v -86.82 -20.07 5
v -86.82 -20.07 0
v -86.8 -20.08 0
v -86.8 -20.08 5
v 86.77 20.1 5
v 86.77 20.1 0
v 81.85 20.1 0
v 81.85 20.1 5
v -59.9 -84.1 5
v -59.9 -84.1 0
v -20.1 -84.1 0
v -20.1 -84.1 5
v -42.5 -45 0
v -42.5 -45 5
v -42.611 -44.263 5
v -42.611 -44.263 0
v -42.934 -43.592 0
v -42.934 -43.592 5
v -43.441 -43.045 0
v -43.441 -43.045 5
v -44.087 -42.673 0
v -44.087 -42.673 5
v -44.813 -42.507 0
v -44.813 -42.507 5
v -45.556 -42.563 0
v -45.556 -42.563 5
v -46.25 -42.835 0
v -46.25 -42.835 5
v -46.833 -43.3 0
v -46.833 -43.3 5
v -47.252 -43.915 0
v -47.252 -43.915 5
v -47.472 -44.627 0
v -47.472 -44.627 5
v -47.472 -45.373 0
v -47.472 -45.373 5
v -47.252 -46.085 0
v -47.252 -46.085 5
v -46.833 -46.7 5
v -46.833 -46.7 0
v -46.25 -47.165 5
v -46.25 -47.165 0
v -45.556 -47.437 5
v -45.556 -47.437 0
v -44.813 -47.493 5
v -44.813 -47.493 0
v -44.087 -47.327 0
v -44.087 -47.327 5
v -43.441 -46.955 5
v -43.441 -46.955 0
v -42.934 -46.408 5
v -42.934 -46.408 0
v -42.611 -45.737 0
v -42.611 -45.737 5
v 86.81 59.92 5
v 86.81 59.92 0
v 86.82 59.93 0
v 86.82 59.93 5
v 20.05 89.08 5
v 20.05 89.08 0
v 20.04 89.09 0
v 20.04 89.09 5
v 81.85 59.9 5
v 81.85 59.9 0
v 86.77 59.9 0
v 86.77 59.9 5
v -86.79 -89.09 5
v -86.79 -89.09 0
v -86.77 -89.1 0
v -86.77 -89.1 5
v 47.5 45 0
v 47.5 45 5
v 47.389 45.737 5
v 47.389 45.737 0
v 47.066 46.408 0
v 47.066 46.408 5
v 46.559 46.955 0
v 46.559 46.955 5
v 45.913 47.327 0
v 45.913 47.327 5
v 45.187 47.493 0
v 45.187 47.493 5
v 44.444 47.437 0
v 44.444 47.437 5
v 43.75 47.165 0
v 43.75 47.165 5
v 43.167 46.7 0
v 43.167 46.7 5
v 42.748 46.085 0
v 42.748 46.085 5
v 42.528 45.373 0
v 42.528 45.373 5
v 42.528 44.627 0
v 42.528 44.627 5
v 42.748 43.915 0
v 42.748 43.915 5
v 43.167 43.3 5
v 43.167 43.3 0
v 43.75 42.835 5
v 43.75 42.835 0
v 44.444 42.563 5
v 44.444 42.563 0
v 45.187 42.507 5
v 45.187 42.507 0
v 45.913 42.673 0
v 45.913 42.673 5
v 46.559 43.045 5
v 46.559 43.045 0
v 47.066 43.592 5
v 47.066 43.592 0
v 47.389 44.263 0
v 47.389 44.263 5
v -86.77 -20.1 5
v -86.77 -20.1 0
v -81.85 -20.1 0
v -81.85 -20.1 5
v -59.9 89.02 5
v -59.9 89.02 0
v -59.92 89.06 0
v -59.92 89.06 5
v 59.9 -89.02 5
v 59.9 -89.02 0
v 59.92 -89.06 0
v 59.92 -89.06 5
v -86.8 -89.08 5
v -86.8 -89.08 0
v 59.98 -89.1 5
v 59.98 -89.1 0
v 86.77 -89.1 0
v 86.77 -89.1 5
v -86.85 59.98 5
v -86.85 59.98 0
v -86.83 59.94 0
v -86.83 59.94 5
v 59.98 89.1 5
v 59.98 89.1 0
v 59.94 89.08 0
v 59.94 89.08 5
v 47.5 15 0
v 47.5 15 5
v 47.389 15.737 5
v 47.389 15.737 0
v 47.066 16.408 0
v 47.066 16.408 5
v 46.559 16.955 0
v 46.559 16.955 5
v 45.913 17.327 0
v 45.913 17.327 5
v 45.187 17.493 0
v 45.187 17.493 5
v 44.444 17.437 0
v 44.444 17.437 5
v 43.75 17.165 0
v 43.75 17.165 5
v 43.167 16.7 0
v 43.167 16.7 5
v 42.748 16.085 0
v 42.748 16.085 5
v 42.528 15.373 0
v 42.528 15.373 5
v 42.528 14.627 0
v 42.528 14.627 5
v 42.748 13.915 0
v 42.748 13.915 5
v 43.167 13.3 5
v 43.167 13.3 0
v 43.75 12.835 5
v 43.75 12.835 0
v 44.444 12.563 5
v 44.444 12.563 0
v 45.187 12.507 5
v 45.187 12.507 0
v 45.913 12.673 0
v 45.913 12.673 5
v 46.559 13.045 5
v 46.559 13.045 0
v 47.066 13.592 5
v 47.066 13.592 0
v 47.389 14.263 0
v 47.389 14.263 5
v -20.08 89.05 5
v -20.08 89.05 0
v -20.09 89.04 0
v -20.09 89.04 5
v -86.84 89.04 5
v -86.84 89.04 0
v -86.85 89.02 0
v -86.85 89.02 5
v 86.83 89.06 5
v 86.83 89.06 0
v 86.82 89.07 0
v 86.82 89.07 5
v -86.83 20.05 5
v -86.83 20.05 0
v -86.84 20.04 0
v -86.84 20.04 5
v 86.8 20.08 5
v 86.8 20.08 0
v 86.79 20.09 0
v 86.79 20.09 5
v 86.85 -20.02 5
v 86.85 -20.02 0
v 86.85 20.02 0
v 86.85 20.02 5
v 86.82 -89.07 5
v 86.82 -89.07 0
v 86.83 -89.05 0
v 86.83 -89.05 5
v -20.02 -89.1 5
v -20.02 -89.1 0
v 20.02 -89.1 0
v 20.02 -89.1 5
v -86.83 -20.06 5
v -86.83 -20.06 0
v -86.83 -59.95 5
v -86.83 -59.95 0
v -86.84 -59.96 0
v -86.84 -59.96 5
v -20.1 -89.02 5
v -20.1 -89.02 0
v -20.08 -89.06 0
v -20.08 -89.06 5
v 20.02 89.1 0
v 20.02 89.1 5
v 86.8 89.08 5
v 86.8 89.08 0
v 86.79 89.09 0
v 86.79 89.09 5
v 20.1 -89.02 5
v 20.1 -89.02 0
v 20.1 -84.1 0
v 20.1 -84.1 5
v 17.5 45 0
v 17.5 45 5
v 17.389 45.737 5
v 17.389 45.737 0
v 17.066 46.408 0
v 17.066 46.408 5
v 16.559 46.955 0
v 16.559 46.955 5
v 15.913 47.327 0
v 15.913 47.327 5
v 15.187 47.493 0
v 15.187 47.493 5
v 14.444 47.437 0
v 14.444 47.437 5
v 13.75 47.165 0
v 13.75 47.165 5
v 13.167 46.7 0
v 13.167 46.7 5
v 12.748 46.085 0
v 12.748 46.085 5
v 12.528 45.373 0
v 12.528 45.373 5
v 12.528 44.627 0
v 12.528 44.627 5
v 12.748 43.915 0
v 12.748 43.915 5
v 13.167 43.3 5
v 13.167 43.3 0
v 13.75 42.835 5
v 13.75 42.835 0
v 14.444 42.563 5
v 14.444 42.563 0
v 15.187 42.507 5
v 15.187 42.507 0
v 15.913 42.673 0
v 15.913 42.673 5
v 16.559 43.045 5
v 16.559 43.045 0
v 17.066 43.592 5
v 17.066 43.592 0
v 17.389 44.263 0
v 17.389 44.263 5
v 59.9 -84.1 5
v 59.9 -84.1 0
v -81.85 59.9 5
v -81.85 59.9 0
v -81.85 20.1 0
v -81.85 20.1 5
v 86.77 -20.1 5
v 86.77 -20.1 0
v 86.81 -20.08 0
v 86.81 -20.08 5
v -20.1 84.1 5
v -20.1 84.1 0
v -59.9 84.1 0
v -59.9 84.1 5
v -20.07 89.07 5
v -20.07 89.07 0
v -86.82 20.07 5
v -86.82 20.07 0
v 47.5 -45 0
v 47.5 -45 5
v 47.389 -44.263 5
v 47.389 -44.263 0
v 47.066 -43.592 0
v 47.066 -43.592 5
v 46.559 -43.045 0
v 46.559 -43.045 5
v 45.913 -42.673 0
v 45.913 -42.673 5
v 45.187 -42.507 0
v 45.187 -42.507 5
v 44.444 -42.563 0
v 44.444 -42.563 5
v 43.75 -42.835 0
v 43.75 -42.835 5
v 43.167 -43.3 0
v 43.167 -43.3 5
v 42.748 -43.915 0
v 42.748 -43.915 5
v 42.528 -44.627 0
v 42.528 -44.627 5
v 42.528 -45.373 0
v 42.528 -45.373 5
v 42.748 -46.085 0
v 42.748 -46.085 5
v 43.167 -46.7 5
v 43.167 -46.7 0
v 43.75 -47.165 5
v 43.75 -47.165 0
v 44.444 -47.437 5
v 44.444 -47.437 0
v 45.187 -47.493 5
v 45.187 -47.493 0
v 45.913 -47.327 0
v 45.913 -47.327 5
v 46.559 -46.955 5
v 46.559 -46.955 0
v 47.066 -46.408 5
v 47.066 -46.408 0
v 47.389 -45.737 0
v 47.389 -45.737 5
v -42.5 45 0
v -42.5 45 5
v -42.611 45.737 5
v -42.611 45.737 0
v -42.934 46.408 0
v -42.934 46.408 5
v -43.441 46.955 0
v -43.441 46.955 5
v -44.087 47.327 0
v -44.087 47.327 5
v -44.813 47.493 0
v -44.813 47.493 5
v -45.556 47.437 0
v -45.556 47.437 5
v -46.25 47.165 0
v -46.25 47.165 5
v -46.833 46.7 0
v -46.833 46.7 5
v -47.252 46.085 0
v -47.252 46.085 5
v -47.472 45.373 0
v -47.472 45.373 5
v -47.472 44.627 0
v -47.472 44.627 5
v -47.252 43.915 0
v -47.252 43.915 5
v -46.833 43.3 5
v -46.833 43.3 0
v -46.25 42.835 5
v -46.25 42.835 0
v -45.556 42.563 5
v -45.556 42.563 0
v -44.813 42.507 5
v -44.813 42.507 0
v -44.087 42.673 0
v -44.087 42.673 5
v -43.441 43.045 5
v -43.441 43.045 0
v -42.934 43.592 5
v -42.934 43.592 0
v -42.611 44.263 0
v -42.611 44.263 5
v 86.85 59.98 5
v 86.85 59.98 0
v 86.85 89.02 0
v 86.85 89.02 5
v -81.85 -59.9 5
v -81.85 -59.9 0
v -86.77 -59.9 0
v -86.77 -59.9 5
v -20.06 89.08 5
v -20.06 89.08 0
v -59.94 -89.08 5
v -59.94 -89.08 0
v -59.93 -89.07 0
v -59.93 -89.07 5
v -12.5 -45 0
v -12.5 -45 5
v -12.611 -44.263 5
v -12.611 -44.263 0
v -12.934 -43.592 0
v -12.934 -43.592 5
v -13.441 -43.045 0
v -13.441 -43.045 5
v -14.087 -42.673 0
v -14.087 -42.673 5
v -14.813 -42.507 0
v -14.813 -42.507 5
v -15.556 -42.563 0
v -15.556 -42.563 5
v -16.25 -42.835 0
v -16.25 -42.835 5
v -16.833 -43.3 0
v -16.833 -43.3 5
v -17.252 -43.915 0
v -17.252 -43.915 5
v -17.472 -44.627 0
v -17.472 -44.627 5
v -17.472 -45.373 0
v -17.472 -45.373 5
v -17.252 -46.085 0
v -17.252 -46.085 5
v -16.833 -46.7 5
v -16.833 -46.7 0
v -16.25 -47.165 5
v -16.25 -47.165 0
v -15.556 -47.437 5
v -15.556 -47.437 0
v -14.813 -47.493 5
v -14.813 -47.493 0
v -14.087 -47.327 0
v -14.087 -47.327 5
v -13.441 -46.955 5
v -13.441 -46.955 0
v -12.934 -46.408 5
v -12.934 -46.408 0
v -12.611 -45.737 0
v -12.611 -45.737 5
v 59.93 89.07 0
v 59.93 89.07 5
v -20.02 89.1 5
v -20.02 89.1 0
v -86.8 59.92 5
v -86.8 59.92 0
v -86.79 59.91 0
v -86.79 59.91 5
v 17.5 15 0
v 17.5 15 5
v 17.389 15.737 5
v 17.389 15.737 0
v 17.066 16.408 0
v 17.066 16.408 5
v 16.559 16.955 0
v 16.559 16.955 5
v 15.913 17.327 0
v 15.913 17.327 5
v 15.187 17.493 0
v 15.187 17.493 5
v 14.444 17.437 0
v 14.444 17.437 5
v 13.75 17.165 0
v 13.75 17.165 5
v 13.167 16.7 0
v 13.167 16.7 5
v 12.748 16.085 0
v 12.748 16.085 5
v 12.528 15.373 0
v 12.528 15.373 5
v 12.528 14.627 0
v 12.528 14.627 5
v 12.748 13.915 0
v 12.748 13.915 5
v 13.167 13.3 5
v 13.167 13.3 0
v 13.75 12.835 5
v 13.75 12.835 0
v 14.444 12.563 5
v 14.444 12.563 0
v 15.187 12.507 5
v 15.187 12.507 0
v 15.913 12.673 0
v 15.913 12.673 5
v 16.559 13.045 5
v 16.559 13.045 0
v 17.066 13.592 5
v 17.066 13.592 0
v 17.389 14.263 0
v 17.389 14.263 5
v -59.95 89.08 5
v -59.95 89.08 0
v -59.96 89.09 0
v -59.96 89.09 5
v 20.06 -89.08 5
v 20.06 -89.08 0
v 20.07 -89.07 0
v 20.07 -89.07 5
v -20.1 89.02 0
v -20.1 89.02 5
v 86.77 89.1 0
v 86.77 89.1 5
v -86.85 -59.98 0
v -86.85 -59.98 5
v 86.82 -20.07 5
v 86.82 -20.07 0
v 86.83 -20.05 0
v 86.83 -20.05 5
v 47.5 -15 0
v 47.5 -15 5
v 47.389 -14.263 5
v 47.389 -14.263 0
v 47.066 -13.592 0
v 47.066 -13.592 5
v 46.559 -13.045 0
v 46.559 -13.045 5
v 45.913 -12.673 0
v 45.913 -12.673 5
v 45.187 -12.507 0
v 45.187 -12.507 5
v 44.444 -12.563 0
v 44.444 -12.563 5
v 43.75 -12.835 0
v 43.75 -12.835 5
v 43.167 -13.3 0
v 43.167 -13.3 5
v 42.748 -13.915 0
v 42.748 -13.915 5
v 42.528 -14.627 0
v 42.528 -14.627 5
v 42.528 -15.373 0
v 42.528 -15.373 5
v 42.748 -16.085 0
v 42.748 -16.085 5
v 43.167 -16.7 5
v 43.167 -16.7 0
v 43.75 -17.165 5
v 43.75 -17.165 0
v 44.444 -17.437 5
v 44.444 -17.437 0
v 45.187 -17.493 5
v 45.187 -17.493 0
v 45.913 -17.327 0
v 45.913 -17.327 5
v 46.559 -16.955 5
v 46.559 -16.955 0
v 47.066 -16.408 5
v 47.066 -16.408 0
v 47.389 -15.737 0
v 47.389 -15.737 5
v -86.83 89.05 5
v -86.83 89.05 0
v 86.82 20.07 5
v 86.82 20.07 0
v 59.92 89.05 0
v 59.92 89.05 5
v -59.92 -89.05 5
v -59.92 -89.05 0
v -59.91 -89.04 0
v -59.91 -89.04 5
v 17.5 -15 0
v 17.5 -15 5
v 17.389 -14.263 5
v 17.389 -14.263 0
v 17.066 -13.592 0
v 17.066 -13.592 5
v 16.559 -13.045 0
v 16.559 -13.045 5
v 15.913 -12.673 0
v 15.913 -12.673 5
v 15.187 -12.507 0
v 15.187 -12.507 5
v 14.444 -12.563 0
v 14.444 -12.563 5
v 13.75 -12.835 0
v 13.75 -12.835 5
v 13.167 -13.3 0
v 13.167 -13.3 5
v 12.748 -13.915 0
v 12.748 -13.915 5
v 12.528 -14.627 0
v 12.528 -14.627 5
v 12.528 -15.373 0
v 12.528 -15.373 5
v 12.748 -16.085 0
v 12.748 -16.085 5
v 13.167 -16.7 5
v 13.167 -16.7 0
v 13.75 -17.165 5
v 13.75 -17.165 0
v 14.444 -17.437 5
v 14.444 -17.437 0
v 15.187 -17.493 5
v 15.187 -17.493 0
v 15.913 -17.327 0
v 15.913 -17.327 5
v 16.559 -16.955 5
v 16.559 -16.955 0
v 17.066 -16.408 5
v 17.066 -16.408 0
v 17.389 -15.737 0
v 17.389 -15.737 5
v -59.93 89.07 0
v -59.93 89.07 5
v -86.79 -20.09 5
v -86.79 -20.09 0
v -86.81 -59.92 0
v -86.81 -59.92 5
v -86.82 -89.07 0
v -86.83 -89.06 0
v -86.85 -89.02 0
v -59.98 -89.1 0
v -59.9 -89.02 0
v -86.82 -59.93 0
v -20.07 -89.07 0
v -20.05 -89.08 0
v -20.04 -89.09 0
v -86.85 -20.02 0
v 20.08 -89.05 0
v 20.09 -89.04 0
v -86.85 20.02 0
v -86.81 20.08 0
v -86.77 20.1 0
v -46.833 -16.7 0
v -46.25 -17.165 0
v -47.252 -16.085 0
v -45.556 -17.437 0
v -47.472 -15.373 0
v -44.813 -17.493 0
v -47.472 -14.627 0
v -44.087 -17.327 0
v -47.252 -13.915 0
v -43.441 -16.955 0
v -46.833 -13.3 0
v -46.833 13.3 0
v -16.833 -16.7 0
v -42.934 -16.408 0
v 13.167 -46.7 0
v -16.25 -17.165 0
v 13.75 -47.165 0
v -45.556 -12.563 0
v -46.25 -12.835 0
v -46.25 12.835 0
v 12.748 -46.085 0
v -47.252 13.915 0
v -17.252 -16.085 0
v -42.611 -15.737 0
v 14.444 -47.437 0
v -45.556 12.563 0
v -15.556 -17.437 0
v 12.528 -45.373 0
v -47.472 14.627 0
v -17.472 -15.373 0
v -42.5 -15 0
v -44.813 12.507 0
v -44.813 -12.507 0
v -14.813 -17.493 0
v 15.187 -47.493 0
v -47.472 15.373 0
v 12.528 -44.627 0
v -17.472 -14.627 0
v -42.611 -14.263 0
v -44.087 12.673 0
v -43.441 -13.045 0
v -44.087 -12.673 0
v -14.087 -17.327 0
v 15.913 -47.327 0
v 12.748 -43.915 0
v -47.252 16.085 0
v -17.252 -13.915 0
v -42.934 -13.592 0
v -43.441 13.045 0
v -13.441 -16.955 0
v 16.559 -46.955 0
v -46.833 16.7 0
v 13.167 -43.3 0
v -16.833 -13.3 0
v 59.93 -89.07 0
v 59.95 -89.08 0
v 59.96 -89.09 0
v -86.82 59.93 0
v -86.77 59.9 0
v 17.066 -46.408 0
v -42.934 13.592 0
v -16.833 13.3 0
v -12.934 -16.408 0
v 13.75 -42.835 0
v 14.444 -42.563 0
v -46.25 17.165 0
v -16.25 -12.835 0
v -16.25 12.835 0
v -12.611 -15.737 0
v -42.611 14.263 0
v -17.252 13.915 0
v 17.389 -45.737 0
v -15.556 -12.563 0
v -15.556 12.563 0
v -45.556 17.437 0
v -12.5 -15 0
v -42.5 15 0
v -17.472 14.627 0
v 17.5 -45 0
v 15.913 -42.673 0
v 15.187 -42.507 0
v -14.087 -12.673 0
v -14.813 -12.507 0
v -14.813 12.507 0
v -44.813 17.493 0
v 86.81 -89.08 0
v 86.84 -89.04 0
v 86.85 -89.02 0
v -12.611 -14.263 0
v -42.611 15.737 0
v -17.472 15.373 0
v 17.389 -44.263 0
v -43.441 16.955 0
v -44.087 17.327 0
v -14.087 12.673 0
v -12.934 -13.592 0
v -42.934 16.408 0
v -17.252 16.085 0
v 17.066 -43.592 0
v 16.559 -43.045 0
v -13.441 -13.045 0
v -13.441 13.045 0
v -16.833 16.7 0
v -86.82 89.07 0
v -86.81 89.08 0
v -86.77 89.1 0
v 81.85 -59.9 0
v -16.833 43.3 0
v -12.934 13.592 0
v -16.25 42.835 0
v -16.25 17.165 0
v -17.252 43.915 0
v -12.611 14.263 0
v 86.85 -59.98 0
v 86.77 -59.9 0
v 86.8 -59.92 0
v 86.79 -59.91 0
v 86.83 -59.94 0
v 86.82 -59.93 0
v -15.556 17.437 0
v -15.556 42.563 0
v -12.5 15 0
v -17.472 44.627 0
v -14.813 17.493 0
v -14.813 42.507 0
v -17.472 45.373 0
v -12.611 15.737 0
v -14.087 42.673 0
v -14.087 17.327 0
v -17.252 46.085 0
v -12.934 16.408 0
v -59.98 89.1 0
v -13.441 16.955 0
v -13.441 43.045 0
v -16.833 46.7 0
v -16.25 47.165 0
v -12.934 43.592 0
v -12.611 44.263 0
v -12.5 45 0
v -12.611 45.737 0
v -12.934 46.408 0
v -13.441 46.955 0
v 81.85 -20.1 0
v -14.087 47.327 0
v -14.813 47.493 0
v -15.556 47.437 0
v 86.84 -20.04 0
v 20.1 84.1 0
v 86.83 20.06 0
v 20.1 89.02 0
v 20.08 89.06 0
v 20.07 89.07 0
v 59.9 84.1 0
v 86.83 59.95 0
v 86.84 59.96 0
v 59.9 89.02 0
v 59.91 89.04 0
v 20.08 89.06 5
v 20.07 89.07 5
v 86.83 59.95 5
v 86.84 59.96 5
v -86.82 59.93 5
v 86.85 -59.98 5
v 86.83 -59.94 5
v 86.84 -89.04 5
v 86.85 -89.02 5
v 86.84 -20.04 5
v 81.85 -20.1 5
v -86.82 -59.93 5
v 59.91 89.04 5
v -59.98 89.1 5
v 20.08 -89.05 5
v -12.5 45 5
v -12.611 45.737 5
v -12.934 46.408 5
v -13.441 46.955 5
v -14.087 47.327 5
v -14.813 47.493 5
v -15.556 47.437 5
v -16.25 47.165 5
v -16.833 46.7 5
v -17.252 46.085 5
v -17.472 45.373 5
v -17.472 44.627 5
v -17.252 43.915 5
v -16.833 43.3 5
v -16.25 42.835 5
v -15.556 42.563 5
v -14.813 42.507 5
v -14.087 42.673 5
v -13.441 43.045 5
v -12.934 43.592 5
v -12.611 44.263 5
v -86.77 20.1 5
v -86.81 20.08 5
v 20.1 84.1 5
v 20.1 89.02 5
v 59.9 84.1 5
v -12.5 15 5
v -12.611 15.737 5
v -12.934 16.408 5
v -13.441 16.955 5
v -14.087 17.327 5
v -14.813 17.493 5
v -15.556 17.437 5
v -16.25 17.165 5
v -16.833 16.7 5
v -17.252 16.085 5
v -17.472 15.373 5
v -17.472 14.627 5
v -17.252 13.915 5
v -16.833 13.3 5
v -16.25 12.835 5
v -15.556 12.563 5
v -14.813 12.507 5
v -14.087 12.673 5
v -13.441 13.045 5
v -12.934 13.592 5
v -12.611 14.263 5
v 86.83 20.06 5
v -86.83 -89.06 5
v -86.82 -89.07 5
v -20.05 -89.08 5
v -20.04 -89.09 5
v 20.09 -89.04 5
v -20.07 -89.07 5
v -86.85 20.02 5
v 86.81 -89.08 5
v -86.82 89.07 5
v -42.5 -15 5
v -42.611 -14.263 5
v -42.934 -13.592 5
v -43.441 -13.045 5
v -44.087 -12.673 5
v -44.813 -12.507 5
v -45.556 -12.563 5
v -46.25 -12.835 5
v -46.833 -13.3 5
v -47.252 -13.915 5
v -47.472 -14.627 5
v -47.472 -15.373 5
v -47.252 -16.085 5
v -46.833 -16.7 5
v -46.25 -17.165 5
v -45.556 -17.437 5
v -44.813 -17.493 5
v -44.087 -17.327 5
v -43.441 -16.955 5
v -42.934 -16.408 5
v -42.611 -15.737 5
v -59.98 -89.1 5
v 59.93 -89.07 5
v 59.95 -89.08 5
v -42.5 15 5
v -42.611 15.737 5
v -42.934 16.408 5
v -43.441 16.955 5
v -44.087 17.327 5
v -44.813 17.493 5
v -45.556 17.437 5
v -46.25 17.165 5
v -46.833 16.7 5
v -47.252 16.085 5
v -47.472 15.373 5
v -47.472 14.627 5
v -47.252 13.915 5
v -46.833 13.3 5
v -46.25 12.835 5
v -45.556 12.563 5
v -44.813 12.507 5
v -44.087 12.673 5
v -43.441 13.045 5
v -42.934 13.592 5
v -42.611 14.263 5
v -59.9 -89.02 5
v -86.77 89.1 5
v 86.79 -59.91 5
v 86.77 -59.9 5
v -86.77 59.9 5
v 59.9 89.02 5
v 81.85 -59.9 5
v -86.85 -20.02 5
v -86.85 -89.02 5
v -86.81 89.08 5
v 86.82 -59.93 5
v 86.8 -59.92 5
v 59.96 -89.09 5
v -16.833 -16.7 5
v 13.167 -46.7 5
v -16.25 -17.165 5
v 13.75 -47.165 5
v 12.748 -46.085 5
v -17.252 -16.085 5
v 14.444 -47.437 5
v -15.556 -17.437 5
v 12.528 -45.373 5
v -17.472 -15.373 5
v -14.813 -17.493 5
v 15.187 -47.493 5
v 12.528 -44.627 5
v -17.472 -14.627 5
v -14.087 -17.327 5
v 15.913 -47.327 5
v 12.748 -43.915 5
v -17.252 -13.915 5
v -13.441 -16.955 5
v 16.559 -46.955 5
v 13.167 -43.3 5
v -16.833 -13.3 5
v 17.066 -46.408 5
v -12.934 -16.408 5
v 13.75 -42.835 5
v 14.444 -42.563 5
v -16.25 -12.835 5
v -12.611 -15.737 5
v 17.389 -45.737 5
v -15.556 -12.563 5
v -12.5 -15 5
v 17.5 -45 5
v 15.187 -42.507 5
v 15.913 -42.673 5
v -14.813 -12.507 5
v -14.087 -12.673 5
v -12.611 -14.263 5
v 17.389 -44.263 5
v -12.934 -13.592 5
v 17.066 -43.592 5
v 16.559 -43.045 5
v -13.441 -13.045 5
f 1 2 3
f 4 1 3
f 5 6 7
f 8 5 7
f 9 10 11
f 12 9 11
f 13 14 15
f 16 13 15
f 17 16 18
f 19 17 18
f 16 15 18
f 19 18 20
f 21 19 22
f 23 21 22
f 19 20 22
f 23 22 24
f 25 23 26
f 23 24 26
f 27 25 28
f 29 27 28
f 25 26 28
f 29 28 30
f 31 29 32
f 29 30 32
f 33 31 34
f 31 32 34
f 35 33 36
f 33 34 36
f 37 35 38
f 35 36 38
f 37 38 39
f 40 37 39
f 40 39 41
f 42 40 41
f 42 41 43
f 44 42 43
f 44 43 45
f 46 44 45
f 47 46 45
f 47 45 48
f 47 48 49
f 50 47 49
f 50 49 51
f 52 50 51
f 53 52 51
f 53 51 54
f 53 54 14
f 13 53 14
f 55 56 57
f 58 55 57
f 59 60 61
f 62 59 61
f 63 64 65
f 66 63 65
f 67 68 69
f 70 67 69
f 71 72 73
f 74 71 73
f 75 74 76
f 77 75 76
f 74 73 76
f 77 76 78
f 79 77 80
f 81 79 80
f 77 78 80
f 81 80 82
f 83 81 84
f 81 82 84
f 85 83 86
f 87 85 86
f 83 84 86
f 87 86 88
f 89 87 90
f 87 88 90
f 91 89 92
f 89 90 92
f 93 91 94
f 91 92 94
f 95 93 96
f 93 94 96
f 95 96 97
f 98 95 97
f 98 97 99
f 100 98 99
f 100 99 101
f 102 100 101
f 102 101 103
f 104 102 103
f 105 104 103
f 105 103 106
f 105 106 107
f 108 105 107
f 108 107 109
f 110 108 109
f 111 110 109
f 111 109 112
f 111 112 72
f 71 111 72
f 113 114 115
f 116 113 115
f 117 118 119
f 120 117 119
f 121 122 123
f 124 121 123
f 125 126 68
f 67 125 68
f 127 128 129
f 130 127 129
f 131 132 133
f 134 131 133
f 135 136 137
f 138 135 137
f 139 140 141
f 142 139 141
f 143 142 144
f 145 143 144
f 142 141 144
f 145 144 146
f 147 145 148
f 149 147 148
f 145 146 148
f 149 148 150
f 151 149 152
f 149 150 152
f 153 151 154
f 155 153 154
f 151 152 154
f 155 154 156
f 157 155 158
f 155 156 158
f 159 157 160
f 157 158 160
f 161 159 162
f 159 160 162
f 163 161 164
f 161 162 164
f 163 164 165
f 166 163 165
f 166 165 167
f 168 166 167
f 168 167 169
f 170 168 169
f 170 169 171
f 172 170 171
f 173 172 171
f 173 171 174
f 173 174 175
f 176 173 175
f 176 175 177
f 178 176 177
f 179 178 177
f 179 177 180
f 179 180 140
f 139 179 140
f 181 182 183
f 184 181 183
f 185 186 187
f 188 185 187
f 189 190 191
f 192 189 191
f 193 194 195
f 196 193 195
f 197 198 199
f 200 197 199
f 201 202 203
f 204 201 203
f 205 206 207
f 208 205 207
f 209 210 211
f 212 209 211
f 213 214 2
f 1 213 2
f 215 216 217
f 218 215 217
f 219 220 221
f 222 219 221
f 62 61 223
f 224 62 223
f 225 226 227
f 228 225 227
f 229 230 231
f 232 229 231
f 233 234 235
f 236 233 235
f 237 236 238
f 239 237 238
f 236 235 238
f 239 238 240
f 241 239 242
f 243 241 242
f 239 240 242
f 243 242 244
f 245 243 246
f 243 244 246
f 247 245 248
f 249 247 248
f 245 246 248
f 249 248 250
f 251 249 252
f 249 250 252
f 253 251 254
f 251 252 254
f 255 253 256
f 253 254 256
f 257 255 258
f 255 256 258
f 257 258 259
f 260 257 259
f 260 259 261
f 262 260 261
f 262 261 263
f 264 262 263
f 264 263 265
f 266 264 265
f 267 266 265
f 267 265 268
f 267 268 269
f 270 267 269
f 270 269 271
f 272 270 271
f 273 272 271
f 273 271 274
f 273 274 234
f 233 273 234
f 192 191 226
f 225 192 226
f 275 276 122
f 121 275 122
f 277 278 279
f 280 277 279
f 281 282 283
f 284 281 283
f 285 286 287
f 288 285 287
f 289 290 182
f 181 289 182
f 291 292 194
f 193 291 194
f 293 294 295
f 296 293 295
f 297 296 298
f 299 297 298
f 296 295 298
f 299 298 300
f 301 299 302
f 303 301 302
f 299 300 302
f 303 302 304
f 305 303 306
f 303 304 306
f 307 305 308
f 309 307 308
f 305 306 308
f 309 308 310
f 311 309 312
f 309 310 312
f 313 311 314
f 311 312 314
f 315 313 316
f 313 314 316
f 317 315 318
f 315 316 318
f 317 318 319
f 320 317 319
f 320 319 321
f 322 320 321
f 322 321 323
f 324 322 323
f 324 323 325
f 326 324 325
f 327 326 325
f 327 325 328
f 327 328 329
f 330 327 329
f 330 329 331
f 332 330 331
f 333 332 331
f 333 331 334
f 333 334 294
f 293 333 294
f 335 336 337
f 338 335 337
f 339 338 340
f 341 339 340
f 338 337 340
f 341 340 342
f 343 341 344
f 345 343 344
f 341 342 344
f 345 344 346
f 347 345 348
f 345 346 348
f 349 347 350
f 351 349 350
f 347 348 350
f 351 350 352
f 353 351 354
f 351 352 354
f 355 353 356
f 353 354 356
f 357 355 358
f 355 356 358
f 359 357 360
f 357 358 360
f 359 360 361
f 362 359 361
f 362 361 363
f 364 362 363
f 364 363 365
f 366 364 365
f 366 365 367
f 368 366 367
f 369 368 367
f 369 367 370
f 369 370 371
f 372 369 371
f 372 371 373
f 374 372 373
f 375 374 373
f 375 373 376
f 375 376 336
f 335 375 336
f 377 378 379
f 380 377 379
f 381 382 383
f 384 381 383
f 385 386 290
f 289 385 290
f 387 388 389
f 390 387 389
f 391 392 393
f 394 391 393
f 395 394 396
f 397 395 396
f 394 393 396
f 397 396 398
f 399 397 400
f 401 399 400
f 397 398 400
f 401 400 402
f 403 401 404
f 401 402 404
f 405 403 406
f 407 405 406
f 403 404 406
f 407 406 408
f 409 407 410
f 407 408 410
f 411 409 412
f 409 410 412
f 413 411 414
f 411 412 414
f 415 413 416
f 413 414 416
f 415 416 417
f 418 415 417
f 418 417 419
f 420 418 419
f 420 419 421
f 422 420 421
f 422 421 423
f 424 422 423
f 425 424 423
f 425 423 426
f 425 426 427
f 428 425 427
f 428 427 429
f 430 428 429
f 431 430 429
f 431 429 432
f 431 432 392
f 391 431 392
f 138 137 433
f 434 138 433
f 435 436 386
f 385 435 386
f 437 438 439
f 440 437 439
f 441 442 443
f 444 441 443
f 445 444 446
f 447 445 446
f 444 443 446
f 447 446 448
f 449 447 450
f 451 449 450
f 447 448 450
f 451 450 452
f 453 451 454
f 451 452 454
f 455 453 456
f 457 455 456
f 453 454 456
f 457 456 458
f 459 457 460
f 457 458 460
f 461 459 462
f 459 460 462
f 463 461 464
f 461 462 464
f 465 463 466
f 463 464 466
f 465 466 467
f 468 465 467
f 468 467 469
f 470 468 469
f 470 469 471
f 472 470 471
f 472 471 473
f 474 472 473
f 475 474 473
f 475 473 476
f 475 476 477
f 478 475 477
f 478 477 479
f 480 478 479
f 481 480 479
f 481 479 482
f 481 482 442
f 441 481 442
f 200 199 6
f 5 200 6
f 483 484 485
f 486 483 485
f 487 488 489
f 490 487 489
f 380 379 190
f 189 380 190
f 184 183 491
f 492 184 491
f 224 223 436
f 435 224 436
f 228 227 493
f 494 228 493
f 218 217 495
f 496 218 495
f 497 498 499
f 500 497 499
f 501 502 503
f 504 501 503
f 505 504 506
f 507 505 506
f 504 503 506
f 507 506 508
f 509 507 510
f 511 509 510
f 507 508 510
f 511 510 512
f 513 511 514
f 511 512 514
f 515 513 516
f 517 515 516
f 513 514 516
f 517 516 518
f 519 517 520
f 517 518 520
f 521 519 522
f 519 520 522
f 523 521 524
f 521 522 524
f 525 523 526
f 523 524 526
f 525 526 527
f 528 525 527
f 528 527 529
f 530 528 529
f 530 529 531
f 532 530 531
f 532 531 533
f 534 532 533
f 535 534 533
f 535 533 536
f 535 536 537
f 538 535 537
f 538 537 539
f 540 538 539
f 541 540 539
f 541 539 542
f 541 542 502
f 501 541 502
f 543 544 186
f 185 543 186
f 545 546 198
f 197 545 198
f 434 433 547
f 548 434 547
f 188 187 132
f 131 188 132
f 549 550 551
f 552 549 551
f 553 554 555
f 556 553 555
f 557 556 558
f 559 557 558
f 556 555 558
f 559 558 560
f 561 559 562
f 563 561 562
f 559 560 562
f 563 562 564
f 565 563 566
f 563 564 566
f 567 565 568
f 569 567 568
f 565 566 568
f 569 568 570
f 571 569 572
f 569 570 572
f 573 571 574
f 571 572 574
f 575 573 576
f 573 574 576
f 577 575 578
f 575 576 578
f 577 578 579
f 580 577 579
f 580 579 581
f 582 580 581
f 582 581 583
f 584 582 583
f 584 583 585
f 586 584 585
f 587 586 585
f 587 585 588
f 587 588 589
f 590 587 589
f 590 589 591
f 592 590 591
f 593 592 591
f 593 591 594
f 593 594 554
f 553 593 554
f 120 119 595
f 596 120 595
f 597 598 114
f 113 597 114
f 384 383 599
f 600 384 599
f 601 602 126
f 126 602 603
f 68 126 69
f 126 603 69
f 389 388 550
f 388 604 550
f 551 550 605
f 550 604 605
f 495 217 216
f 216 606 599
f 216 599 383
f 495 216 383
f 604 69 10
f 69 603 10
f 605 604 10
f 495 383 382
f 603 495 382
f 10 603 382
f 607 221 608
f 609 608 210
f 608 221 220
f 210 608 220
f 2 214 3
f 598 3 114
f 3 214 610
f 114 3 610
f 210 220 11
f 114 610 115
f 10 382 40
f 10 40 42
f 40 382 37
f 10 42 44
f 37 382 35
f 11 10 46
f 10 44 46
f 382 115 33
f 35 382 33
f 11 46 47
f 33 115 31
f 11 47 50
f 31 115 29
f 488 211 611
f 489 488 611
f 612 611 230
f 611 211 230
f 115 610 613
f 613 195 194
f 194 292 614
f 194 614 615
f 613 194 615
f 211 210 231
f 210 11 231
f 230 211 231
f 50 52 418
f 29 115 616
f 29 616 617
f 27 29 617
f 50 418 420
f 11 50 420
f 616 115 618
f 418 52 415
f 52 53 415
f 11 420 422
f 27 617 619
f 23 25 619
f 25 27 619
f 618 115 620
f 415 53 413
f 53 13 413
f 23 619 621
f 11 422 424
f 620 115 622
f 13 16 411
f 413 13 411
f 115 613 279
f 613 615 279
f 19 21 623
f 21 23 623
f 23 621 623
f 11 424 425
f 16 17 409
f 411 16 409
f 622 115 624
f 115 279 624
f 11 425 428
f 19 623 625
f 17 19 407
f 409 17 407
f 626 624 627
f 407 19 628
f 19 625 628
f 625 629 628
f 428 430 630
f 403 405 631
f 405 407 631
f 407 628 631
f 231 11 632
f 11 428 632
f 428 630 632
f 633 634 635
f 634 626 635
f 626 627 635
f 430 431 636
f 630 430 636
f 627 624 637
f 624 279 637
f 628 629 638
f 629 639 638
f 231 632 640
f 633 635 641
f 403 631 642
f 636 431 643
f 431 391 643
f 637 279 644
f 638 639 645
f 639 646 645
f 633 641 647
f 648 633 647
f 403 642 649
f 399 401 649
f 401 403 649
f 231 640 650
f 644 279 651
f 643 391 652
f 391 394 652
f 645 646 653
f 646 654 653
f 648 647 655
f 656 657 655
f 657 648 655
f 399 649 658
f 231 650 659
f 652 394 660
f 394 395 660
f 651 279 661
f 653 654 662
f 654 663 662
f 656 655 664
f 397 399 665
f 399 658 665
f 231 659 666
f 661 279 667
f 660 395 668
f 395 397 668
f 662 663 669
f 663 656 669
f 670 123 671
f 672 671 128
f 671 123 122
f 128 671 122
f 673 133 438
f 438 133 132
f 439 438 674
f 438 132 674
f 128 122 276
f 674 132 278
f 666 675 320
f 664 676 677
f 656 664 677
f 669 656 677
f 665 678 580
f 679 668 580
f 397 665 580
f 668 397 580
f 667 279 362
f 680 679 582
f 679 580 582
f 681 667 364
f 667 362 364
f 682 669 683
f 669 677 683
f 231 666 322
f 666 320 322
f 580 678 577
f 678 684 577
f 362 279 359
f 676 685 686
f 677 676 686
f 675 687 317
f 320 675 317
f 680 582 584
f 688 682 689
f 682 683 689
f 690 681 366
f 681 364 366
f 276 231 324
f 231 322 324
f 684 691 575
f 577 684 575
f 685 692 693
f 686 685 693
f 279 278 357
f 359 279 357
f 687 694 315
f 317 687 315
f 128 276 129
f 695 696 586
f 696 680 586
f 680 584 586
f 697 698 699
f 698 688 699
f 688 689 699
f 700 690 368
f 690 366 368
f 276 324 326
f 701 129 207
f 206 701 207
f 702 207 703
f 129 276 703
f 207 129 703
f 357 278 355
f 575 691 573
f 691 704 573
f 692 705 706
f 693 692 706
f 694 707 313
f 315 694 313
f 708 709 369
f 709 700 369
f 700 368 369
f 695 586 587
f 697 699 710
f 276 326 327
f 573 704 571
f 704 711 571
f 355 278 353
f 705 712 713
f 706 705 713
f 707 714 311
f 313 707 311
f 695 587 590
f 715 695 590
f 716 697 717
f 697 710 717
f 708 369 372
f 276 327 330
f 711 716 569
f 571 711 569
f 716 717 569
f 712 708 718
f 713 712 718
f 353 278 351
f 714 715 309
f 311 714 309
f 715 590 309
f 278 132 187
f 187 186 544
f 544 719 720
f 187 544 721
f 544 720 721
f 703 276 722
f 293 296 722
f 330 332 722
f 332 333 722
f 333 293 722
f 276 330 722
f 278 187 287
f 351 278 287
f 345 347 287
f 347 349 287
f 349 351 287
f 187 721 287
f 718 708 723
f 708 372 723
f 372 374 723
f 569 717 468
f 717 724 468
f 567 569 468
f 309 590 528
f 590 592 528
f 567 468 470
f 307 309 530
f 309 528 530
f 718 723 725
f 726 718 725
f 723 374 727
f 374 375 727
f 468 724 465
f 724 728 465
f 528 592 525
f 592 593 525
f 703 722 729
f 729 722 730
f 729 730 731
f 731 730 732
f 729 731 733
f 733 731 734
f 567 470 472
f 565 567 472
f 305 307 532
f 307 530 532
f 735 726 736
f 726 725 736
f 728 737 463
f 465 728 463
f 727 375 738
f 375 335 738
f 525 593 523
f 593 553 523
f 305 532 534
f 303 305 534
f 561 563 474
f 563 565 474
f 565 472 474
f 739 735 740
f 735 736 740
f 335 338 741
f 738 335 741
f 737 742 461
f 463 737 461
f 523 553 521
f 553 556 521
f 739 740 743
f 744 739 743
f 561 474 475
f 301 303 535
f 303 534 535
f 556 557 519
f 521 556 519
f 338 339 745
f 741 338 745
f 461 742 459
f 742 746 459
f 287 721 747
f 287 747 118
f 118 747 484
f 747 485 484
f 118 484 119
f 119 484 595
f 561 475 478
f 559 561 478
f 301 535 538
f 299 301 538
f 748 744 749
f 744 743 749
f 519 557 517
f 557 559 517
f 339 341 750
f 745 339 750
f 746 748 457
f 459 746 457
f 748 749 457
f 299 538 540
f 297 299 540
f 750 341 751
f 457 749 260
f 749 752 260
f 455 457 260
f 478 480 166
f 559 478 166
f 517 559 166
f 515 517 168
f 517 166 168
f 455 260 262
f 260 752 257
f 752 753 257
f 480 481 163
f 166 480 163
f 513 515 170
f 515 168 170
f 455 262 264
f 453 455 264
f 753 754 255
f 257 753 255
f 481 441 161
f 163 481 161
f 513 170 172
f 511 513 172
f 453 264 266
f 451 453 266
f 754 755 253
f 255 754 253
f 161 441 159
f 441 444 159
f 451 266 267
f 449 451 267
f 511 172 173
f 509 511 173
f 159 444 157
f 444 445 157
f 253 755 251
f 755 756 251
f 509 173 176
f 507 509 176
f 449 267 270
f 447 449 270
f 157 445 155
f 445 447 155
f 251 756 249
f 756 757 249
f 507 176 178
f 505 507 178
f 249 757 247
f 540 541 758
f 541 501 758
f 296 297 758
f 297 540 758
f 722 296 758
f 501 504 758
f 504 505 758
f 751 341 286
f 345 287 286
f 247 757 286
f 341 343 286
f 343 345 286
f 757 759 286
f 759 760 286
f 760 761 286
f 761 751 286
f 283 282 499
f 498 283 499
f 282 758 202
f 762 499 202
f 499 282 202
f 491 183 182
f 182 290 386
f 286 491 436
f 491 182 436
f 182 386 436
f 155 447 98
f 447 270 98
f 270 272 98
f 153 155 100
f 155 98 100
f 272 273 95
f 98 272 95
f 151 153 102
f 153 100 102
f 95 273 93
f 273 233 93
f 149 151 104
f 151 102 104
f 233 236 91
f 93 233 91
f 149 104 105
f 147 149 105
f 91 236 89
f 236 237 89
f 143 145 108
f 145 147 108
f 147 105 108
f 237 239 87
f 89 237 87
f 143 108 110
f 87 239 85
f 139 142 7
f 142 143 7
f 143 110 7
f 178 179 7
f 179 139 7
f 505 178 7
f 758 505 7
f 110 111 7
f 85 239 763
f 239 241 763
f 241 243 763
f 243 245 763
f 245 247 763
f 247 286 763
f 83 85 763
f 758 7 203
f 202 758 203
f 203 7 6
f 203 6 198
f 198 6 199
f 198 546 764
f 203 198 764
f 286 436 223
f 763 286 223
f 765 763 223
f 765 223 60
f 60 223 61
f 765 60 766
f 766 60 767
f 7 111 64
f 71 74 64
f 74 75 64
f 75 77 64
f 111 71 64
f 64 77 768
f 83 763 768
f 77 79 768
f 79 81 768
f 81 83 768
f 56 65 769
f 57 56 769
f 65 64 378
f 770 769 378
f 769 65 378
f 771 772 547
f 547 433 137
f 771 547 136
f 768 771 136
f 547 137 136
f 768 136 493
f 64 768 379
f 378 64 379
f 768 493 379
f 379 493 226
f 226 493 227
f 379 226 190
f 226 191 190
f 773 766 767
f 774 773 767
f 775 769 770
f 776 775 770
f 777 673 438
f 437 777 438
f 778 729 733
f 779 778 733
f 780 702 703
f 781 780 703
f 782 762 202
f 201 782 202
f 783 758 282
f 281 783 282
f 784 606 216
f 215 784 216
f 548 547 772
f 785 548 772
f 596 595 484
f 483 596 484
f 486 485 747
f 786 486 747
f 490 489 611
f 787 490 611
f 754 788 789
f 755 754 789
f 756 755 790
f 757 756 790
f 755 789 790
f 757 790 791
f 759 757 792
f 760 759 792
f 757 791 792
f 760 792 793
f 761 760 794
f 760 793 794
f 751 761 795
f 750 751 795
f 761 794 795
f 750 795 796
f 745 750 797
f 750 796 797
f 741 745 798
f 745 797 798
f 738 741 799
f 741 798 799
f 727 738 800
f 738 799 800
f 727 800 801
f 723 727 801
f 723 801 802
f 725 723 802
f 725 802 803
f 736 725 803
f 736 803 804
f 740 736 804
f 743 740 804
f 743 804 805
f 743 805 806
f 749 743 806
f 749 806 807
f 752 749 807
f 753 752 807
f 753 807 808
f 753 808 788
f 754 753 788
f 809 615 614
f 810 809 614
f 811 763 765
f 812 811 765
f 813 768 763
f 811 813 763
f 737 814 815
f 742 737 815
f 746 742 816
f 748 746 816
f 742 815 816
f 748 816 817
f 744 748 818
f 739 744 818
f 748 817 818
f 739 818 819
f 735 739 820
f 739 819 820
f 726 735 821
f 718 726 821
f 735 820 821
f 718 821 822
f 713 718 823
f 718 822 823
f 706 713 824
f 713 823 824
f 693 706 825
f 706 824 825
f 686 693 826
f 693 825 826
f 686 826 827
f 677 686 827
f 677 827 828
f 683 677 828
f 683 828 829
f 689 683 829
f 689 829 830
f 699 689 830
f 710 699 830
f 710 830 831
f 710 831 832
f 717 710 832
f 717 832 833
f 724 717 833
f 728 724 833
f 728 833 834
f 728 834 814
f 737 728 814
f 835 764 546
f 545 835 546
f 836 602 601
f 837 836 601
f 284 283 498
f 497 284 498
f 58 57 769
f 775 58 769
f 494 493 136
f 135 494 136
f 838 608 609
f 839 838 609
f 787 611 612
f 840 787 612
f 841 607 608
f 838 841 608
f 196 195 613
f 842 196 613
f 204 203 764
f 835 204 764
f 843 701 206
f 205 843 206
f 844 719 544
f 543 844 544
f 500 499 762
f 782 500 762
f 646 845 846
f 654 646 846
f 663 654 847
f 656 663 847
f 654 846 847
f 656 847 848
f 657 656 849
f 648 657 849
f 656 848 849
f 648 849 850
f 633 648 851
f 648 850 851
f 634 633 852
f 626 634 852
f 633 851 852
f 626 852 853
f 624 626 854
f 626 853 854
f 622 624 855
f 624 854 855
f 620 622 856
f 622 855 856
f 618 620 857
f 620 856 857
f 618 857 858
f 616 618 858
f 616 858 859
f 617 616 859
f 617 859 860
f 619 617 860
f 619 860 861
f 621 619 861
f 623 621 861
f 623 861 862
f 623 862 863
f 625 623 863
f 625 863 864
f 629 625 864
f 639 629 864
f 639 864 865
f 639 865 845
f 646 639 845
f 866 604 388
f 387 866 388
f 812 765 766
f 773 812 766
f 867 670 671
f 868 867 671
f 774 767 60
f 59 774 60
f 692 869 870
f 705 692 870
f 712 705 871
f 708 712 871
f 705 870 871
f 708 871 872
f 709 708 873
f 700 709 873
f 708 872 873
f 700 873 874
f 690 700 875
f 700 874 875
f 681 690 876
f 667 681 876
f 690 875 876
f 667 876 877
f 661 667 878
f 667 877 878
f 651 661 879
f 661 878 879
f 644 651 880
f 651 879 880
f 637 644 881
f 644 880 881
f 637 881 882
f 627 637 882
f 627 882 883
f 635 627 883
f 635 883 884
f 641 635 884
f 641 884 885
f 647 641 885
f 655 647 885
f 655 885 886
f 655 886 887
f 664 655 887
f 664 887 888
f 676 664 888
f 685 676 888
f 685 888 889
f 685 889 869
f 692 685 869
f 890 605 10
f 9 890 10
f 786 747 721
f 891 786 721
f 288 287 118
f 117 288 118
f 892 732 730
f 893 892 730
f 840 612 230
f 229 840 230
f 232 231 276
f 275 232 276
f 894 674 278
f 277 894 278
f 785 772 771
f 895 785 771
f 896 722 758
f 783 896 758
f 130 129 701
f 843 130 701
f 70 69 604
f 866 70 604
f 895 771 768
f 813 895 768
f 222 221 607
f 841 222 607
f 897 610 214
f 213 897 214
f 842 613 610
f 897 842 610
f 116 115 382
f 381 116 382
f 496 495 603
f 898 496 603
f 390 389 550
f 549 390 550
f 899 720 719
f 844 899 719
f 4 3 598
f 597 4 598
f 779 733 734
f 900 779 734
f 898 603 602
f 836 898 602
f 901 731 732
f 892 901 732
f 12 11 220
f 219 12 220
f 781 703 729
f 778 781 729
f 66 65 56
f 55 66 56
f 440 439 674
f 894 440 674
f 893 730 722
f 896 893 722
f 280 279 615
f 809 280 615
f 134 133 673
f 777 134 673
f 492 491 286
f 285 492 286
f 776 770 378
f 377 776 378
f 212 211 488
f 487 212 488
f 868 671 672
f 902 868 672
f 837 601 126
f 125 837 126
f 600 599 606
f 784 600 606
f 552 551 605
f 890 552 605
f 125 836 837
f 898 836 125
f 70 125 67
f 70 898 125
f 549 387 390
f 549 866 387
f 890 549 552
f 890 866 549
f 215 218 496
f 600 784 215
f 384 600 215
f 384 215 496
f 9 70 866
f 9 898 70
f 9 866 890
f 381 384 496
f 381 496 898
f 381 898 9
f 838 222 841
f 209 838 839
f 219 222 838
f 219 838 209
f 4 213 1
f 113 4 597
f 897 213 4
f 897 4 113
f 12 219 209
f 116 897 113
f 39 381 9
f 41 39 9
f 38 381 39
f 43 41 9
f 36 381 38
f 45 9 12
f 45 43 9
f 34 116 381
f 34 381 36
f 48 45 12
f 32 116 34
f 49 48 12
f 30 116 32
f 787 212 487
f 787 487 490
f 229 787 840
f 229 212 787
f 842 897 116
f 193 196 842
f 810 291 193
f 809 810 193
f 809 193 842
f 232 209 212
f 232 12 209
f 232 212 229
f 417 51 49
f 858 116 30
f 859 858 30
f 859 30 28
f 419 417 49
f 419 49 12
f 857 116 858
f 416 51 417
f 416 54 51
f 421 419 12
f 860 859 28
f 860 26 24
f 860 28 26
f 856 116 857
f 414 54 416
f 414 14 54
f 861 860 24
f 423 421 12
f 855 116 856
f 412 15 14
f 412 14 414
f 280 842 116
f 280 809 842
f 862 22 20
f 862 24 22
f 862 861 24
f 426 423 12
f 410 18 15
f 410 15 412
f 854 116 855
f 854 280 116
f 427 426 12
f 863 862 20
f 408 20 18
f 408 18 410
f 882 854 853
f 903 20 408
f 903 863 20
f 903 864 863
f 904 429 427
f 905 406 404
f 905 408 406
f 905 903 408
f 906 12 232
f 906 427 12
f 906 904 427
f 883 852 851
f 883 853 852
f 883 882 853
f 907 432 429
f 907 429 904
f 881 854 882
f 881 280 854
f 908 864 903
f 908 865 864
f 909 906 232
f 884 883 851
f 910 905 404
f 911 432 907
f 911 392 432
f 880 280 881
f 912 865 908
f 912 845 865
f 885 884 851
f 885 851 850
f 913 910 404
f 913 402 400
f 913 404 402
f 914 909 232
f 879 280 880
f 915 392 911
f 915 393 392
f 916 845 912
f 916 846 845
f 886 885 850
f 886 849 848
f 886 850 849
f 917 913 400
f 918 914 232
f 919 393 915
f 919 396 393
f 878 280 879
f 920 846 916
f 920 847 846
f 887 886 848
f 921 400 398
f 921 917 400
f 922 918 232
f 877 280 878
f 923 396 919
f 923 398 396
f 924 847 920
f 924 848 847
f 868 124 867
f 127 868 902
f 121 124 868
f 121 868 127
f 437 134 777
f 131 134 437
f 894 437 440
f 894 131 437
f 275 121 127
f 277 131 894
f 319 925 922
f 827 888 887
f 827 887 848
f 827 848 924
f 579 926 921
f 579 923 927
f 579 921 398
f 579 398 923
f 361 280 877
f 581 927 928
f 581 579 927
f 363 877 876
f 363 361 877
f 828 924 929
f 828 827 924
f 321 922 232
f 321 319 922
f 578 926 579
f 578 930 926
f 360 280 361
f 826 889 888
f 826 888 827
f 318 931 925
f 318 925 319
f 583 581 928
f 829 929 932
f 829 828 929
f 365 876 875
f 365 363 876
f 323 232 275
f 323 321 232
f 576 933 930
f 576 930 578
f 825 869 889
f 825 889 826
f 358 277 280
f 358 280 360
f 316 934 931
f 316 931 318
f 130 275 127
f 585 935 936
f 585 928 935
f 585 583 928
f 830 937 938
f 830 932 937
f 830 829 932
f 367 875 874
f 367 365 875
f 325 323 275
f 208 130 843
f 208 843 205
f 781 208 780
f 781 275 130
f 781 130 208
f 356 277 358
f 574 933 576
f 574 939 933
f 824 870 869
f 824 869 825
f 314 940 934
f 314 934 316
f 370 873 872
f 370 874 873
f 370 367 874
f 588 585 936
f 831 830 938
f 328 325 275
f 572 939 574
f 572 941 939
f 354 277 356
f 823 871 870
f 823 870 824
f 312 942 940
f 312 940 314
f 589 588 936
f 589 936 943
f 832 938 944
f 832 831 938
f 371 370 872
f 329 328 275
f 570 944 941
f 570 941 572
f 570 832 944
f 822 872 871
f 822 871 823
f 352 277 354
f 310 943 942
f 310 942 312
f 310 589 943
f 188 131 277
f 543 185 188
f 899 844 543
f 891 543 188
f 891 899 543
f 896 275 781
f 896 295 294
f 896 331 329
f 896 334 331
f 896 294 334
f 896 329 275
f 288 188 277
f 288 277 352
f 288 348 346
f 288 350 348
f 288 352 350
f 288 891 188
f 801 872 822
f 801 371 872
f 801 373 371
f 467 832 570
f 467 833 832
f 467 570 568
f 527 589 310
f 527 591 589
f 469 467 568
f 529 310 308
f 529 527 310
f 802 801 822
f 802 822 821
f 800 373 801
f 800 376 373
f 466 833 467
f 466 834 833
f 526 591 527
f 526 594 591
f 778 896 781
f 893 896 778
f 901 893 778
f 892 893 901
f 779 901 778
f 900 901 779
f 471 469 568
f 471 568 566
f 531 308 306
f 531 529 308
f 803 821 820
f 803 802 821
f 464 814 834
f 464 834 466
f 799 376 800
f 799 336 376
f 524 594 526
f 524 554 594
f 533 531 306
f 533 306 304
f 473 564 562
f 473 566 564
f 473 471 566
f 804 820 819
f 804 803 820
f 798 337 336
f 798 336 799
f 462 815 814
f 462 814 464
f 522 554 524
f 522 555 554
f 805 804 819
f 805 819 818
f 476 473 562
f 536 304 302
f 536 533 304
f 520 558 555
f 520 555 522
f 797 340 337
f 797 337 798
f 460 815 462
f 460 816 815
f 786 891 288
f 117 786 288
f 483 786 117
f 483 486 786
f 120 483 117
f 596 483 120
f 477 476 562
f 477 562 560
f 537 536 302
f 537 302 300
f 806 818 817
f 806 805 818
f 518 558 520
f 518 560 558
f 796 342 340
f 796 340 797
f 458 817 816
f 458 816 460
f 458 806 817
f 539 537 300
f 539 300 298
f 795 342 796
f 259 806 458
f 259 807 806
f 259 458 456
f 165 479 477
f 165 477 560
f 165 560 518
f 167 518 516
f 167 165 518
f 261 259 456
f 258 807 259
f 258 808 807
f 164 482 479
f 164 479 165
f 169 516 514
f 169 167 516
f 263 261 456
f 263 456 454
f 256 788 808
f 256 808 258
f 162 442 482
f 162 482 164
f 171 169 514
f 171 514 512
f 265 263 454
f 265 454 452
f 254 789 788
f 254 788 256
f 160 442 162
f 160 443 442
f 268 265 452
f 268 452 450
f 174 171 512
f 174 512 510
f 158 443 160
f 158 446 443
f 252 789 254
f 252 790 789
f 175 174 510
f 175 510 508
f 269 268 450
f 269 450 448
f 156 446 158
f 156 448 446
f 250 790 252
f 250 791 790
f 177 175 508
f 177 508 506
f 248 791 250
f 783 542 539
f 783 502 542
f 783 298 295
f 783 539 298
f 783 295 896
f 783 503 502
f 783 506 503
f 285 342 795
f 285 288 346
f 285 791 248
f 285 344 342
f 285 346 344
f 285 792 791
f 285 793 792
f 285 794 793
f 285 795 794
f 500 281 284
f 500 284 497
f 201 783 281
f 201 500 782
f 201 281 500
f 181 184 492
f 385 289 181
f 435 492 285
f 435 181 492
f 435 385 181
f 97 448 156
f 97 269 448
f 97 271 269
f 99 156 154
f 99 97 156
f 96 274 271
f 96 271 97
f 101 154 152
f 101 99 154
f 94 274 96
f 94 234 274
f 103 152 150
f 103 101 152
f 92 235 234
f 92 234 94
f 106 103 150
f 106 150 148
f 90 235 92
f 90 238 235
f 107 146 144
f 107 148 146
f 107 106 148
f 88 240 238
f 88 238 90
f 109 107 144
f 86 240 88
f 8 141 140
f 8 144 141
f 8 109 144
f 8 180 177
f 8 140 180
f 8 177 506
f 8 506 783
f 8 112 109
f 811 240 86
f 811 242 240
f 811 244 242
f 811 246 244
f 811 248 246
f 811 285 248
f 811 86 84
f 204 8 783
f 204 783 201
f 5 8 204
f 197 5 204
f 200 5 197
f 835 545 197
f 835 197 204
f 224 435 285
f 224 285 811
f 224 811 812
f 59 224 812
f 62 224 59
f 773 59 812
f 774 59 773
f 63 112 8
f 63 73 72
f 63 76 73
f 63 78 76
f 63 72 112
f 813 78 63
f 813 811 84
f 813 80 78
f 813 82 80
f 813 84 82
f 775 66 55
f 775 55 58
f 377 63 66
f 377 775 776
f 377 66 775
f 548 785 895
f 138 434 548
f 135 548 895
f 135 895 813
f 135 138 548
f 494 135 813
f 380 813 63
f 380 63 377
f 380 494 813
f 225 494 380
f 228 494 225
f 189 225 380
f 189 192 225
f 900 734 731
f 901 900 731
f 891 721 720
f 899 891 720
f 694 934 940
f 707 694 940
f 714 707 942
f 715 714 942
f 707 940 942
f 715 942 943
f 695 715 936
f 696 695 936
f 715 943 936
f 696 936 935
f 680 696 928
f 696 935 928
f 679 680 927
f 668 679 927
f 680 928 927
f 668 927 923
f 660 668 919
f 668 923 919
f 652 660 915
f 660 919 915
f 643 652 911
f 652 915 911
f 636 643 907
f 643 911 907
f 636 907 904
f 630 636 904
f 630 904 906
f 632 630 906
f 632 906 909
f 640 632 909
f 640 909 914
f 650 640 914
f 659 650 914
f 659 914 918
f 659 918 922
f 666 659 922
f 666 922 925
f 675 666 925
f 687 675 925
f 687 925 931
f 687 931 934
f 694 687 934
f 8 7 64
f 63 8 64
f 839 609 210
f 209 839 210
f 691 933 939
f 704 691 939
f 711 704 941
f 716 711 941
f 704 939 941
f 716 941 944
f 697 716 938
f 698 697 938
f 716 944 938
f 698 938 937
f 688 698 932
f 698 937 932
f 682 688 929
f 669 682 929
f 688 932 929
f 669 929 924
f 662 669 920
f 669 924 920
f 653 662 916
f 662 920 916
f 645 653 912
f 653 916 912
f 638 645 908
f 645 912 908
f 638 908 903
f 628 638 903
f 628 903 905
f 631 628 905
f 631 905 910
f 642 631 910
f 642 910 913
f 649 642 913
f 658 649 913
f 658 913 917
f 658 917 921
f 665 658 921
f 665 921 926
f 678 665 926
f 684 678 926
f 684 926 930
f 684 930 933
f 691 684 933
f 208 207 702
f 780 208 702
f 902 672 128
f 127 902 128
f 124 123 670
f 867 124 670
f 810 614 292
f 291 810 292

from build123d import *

# Parameters (mm, degrees)
BOSS_EXTRUDE1_DEPTH = 5
SKETCH2_R           = 2.5
CUT_EXTRUDE1_DEPTH  = 125.526031415


with BuildPart() as part:
    # Model → Boss-Extrude1 (new body)
    with BuildSketch(Plane.XY):
        Polygon((-59.94, -89.08), (-59.93, -89.07), (-59.92, -89.05), (-59.91, -89.04), (-59.9, -89.02), (-59.9, -84.1), (-20.1, -84.1), (-20.1, -89.02), (-20.08, -89.06), (-20.07, -89.07), (-20.05, -89.08), (-20.04, -89.09), (-20.02, -89.1), (20.02, -89.1), (20.06, -89.08), (20.07, -89.07), (20.08, -89.05), (20.09, -89.04), (20.1, -89.02), (20.1, -84.1), (59.9, -84.1), (59.9, -89.02), (59.92, -89.06), (59.93, -89.07), (59.95, -89.08), (59.96, -89.09), (59.98, -89.1), (86.77, -89.1), (86.81, -89.08), (86.82, -89.07), (86.83, -89.05), (86.84, -89.04), (86.85, -89.02), (86.85, -59.98), (86.83, -59.94), (86.82, -59.93), (86.8, -59.92), (86.79, -59.91), (86.77, -59.9), (81.85, -59.9), (81.85, -20.1), (86.77, -20.1), (86.81, -20.08), (86.82, -20.07), (86.83, -20.05), (86.84, -20.04), (86.85, -20.02), (86.85, 20.02), (86.83, 20.06), (86.82, 20.07), (86.8, 20.08), (86.79, 20.09), (86.77, 20.1), (81.85, 20.1), (81.85, 59.9), (86.77, 59.9), (86.81, 59.92), (86.82, 59.93), (86.83, 59.95), (86.84, 59.96), (86.85, 59.98), (86.85, 89.02), (86.83, 89.06), (86.82, 89.07), (86.8, 89.08), (86.79, 89.09), (86.77, 89.1), (59.98, 89.1), (59.94, 89.08), (59.93, 89.07), (59.92, 89.05), (59.91, 89.04), (59.9, 89.02), (59.9, 84.1), (20.1, 84.1), (20.1, 89.02), (20.08, 89.06), (20.07, 89.07), (20.05, 89.08), (20.04, 89.09), (20.02, 89.1), (-20.02, 89.1), (-20.06, 89.08), (-20.07, 89.07), (-20.08, 89.05), (-20.09, 89.04), (-20.1, 89.02), (-20.1, 84.1), (-59.9, 84.1), (-59.9, 89.02), (-59.92, 89.06), (-59.93, 89.07), (-59.95, 89.08), (-59.96, 89.09), (-59.98, 89.1), (-86.77, 89.1), (-86.81, 89.08), (-86.82, 89.07), (-86.83, 89.05), (-86.84, 89.04), (-86.85, 89.02), (-86.85, 59.98), (-86.83, 59.94), (-86.82, 59.93), (-86.8, 59.92), (-86.79, 59.91), (-86.77, 59.9), (-81.85, 59.9), (-81.85, 20.1), (-86.77, 20.1), (-86.81, 20.08), (-86.82, 20.07), (-86.83, 20.05), (-86.84, 20.04), (-86.85, 20.02), (-86.85, -20.02), (-86.83, -20.06), (-86.82, -20.07), (-86.8, -20.08), (-86.79, -20.09), (-86.77, -20.1), (-81.85, -20.1), (-81.85, -59.9), (-86.77, -59.9), (-86.81, -59.92), (-86.82, -59.93), (-86.83, -59.95), (-86.84, -59.96), (-86.85, -59.98), (-86.85, -89.02), (-86.83, -89.06), (-86.82, -89.07), (-86.8, -89.08), (-86.79, -89.09), (-86.77, -89.1), (-59.98, -89.1), align=None)
    extrude(amount=BOSS_EXTRUDE1_DEPTH)

    # Sketch2 → Cut-Extrude1 (cut, through all)
    with BuildSketch(Plane.XY.offset(5)):
        with Locations((-45, 45)):
            Circle(SKETCH2_R)
        with Locations((-15, 45)):
            Circle(SKETCH2_R)
        with Locations((15, 45)):
            Circle(SKETCH2_R)
        with Locations((45, 45)):
            Circle(SKETCH2_R)
        with Locations((-15, 15)):
            Circle(SKETCH2_R)
        with Locations((15, 15)):
            Circle(SKETCH2_R)
        with Locations((45, 15)):
            Circle(SKETCH2_R)
        with Locations((-15, -15)):
            Circle(SKETCH2_R)
        with Locations((15, -15)):
            Circle(SKETCH2_R)
        with Locations((45, -15)):
            Circle(SKETCH2_R)
        with Locations((-15, -45)):
            Circle(SKETCH2_R)
        with Locations((15, -45)):
            Circle(SKETCH2_R)
        with Locations((45, -45)):
            Circle(SKETCH2_R)
        with Locations((-45, 15)):
            Circle(SKETCH2_R)
        with Locations((-45, -15)):
            Circle(SKETCH2_R)
        with Locations((-45, -45)):
            Circle(SKETCH2_R)
    extrude(amount=-CUT_EXTRUDE1_DEPTH, mode=Mode.SUBTRACT)


solid = part.part
